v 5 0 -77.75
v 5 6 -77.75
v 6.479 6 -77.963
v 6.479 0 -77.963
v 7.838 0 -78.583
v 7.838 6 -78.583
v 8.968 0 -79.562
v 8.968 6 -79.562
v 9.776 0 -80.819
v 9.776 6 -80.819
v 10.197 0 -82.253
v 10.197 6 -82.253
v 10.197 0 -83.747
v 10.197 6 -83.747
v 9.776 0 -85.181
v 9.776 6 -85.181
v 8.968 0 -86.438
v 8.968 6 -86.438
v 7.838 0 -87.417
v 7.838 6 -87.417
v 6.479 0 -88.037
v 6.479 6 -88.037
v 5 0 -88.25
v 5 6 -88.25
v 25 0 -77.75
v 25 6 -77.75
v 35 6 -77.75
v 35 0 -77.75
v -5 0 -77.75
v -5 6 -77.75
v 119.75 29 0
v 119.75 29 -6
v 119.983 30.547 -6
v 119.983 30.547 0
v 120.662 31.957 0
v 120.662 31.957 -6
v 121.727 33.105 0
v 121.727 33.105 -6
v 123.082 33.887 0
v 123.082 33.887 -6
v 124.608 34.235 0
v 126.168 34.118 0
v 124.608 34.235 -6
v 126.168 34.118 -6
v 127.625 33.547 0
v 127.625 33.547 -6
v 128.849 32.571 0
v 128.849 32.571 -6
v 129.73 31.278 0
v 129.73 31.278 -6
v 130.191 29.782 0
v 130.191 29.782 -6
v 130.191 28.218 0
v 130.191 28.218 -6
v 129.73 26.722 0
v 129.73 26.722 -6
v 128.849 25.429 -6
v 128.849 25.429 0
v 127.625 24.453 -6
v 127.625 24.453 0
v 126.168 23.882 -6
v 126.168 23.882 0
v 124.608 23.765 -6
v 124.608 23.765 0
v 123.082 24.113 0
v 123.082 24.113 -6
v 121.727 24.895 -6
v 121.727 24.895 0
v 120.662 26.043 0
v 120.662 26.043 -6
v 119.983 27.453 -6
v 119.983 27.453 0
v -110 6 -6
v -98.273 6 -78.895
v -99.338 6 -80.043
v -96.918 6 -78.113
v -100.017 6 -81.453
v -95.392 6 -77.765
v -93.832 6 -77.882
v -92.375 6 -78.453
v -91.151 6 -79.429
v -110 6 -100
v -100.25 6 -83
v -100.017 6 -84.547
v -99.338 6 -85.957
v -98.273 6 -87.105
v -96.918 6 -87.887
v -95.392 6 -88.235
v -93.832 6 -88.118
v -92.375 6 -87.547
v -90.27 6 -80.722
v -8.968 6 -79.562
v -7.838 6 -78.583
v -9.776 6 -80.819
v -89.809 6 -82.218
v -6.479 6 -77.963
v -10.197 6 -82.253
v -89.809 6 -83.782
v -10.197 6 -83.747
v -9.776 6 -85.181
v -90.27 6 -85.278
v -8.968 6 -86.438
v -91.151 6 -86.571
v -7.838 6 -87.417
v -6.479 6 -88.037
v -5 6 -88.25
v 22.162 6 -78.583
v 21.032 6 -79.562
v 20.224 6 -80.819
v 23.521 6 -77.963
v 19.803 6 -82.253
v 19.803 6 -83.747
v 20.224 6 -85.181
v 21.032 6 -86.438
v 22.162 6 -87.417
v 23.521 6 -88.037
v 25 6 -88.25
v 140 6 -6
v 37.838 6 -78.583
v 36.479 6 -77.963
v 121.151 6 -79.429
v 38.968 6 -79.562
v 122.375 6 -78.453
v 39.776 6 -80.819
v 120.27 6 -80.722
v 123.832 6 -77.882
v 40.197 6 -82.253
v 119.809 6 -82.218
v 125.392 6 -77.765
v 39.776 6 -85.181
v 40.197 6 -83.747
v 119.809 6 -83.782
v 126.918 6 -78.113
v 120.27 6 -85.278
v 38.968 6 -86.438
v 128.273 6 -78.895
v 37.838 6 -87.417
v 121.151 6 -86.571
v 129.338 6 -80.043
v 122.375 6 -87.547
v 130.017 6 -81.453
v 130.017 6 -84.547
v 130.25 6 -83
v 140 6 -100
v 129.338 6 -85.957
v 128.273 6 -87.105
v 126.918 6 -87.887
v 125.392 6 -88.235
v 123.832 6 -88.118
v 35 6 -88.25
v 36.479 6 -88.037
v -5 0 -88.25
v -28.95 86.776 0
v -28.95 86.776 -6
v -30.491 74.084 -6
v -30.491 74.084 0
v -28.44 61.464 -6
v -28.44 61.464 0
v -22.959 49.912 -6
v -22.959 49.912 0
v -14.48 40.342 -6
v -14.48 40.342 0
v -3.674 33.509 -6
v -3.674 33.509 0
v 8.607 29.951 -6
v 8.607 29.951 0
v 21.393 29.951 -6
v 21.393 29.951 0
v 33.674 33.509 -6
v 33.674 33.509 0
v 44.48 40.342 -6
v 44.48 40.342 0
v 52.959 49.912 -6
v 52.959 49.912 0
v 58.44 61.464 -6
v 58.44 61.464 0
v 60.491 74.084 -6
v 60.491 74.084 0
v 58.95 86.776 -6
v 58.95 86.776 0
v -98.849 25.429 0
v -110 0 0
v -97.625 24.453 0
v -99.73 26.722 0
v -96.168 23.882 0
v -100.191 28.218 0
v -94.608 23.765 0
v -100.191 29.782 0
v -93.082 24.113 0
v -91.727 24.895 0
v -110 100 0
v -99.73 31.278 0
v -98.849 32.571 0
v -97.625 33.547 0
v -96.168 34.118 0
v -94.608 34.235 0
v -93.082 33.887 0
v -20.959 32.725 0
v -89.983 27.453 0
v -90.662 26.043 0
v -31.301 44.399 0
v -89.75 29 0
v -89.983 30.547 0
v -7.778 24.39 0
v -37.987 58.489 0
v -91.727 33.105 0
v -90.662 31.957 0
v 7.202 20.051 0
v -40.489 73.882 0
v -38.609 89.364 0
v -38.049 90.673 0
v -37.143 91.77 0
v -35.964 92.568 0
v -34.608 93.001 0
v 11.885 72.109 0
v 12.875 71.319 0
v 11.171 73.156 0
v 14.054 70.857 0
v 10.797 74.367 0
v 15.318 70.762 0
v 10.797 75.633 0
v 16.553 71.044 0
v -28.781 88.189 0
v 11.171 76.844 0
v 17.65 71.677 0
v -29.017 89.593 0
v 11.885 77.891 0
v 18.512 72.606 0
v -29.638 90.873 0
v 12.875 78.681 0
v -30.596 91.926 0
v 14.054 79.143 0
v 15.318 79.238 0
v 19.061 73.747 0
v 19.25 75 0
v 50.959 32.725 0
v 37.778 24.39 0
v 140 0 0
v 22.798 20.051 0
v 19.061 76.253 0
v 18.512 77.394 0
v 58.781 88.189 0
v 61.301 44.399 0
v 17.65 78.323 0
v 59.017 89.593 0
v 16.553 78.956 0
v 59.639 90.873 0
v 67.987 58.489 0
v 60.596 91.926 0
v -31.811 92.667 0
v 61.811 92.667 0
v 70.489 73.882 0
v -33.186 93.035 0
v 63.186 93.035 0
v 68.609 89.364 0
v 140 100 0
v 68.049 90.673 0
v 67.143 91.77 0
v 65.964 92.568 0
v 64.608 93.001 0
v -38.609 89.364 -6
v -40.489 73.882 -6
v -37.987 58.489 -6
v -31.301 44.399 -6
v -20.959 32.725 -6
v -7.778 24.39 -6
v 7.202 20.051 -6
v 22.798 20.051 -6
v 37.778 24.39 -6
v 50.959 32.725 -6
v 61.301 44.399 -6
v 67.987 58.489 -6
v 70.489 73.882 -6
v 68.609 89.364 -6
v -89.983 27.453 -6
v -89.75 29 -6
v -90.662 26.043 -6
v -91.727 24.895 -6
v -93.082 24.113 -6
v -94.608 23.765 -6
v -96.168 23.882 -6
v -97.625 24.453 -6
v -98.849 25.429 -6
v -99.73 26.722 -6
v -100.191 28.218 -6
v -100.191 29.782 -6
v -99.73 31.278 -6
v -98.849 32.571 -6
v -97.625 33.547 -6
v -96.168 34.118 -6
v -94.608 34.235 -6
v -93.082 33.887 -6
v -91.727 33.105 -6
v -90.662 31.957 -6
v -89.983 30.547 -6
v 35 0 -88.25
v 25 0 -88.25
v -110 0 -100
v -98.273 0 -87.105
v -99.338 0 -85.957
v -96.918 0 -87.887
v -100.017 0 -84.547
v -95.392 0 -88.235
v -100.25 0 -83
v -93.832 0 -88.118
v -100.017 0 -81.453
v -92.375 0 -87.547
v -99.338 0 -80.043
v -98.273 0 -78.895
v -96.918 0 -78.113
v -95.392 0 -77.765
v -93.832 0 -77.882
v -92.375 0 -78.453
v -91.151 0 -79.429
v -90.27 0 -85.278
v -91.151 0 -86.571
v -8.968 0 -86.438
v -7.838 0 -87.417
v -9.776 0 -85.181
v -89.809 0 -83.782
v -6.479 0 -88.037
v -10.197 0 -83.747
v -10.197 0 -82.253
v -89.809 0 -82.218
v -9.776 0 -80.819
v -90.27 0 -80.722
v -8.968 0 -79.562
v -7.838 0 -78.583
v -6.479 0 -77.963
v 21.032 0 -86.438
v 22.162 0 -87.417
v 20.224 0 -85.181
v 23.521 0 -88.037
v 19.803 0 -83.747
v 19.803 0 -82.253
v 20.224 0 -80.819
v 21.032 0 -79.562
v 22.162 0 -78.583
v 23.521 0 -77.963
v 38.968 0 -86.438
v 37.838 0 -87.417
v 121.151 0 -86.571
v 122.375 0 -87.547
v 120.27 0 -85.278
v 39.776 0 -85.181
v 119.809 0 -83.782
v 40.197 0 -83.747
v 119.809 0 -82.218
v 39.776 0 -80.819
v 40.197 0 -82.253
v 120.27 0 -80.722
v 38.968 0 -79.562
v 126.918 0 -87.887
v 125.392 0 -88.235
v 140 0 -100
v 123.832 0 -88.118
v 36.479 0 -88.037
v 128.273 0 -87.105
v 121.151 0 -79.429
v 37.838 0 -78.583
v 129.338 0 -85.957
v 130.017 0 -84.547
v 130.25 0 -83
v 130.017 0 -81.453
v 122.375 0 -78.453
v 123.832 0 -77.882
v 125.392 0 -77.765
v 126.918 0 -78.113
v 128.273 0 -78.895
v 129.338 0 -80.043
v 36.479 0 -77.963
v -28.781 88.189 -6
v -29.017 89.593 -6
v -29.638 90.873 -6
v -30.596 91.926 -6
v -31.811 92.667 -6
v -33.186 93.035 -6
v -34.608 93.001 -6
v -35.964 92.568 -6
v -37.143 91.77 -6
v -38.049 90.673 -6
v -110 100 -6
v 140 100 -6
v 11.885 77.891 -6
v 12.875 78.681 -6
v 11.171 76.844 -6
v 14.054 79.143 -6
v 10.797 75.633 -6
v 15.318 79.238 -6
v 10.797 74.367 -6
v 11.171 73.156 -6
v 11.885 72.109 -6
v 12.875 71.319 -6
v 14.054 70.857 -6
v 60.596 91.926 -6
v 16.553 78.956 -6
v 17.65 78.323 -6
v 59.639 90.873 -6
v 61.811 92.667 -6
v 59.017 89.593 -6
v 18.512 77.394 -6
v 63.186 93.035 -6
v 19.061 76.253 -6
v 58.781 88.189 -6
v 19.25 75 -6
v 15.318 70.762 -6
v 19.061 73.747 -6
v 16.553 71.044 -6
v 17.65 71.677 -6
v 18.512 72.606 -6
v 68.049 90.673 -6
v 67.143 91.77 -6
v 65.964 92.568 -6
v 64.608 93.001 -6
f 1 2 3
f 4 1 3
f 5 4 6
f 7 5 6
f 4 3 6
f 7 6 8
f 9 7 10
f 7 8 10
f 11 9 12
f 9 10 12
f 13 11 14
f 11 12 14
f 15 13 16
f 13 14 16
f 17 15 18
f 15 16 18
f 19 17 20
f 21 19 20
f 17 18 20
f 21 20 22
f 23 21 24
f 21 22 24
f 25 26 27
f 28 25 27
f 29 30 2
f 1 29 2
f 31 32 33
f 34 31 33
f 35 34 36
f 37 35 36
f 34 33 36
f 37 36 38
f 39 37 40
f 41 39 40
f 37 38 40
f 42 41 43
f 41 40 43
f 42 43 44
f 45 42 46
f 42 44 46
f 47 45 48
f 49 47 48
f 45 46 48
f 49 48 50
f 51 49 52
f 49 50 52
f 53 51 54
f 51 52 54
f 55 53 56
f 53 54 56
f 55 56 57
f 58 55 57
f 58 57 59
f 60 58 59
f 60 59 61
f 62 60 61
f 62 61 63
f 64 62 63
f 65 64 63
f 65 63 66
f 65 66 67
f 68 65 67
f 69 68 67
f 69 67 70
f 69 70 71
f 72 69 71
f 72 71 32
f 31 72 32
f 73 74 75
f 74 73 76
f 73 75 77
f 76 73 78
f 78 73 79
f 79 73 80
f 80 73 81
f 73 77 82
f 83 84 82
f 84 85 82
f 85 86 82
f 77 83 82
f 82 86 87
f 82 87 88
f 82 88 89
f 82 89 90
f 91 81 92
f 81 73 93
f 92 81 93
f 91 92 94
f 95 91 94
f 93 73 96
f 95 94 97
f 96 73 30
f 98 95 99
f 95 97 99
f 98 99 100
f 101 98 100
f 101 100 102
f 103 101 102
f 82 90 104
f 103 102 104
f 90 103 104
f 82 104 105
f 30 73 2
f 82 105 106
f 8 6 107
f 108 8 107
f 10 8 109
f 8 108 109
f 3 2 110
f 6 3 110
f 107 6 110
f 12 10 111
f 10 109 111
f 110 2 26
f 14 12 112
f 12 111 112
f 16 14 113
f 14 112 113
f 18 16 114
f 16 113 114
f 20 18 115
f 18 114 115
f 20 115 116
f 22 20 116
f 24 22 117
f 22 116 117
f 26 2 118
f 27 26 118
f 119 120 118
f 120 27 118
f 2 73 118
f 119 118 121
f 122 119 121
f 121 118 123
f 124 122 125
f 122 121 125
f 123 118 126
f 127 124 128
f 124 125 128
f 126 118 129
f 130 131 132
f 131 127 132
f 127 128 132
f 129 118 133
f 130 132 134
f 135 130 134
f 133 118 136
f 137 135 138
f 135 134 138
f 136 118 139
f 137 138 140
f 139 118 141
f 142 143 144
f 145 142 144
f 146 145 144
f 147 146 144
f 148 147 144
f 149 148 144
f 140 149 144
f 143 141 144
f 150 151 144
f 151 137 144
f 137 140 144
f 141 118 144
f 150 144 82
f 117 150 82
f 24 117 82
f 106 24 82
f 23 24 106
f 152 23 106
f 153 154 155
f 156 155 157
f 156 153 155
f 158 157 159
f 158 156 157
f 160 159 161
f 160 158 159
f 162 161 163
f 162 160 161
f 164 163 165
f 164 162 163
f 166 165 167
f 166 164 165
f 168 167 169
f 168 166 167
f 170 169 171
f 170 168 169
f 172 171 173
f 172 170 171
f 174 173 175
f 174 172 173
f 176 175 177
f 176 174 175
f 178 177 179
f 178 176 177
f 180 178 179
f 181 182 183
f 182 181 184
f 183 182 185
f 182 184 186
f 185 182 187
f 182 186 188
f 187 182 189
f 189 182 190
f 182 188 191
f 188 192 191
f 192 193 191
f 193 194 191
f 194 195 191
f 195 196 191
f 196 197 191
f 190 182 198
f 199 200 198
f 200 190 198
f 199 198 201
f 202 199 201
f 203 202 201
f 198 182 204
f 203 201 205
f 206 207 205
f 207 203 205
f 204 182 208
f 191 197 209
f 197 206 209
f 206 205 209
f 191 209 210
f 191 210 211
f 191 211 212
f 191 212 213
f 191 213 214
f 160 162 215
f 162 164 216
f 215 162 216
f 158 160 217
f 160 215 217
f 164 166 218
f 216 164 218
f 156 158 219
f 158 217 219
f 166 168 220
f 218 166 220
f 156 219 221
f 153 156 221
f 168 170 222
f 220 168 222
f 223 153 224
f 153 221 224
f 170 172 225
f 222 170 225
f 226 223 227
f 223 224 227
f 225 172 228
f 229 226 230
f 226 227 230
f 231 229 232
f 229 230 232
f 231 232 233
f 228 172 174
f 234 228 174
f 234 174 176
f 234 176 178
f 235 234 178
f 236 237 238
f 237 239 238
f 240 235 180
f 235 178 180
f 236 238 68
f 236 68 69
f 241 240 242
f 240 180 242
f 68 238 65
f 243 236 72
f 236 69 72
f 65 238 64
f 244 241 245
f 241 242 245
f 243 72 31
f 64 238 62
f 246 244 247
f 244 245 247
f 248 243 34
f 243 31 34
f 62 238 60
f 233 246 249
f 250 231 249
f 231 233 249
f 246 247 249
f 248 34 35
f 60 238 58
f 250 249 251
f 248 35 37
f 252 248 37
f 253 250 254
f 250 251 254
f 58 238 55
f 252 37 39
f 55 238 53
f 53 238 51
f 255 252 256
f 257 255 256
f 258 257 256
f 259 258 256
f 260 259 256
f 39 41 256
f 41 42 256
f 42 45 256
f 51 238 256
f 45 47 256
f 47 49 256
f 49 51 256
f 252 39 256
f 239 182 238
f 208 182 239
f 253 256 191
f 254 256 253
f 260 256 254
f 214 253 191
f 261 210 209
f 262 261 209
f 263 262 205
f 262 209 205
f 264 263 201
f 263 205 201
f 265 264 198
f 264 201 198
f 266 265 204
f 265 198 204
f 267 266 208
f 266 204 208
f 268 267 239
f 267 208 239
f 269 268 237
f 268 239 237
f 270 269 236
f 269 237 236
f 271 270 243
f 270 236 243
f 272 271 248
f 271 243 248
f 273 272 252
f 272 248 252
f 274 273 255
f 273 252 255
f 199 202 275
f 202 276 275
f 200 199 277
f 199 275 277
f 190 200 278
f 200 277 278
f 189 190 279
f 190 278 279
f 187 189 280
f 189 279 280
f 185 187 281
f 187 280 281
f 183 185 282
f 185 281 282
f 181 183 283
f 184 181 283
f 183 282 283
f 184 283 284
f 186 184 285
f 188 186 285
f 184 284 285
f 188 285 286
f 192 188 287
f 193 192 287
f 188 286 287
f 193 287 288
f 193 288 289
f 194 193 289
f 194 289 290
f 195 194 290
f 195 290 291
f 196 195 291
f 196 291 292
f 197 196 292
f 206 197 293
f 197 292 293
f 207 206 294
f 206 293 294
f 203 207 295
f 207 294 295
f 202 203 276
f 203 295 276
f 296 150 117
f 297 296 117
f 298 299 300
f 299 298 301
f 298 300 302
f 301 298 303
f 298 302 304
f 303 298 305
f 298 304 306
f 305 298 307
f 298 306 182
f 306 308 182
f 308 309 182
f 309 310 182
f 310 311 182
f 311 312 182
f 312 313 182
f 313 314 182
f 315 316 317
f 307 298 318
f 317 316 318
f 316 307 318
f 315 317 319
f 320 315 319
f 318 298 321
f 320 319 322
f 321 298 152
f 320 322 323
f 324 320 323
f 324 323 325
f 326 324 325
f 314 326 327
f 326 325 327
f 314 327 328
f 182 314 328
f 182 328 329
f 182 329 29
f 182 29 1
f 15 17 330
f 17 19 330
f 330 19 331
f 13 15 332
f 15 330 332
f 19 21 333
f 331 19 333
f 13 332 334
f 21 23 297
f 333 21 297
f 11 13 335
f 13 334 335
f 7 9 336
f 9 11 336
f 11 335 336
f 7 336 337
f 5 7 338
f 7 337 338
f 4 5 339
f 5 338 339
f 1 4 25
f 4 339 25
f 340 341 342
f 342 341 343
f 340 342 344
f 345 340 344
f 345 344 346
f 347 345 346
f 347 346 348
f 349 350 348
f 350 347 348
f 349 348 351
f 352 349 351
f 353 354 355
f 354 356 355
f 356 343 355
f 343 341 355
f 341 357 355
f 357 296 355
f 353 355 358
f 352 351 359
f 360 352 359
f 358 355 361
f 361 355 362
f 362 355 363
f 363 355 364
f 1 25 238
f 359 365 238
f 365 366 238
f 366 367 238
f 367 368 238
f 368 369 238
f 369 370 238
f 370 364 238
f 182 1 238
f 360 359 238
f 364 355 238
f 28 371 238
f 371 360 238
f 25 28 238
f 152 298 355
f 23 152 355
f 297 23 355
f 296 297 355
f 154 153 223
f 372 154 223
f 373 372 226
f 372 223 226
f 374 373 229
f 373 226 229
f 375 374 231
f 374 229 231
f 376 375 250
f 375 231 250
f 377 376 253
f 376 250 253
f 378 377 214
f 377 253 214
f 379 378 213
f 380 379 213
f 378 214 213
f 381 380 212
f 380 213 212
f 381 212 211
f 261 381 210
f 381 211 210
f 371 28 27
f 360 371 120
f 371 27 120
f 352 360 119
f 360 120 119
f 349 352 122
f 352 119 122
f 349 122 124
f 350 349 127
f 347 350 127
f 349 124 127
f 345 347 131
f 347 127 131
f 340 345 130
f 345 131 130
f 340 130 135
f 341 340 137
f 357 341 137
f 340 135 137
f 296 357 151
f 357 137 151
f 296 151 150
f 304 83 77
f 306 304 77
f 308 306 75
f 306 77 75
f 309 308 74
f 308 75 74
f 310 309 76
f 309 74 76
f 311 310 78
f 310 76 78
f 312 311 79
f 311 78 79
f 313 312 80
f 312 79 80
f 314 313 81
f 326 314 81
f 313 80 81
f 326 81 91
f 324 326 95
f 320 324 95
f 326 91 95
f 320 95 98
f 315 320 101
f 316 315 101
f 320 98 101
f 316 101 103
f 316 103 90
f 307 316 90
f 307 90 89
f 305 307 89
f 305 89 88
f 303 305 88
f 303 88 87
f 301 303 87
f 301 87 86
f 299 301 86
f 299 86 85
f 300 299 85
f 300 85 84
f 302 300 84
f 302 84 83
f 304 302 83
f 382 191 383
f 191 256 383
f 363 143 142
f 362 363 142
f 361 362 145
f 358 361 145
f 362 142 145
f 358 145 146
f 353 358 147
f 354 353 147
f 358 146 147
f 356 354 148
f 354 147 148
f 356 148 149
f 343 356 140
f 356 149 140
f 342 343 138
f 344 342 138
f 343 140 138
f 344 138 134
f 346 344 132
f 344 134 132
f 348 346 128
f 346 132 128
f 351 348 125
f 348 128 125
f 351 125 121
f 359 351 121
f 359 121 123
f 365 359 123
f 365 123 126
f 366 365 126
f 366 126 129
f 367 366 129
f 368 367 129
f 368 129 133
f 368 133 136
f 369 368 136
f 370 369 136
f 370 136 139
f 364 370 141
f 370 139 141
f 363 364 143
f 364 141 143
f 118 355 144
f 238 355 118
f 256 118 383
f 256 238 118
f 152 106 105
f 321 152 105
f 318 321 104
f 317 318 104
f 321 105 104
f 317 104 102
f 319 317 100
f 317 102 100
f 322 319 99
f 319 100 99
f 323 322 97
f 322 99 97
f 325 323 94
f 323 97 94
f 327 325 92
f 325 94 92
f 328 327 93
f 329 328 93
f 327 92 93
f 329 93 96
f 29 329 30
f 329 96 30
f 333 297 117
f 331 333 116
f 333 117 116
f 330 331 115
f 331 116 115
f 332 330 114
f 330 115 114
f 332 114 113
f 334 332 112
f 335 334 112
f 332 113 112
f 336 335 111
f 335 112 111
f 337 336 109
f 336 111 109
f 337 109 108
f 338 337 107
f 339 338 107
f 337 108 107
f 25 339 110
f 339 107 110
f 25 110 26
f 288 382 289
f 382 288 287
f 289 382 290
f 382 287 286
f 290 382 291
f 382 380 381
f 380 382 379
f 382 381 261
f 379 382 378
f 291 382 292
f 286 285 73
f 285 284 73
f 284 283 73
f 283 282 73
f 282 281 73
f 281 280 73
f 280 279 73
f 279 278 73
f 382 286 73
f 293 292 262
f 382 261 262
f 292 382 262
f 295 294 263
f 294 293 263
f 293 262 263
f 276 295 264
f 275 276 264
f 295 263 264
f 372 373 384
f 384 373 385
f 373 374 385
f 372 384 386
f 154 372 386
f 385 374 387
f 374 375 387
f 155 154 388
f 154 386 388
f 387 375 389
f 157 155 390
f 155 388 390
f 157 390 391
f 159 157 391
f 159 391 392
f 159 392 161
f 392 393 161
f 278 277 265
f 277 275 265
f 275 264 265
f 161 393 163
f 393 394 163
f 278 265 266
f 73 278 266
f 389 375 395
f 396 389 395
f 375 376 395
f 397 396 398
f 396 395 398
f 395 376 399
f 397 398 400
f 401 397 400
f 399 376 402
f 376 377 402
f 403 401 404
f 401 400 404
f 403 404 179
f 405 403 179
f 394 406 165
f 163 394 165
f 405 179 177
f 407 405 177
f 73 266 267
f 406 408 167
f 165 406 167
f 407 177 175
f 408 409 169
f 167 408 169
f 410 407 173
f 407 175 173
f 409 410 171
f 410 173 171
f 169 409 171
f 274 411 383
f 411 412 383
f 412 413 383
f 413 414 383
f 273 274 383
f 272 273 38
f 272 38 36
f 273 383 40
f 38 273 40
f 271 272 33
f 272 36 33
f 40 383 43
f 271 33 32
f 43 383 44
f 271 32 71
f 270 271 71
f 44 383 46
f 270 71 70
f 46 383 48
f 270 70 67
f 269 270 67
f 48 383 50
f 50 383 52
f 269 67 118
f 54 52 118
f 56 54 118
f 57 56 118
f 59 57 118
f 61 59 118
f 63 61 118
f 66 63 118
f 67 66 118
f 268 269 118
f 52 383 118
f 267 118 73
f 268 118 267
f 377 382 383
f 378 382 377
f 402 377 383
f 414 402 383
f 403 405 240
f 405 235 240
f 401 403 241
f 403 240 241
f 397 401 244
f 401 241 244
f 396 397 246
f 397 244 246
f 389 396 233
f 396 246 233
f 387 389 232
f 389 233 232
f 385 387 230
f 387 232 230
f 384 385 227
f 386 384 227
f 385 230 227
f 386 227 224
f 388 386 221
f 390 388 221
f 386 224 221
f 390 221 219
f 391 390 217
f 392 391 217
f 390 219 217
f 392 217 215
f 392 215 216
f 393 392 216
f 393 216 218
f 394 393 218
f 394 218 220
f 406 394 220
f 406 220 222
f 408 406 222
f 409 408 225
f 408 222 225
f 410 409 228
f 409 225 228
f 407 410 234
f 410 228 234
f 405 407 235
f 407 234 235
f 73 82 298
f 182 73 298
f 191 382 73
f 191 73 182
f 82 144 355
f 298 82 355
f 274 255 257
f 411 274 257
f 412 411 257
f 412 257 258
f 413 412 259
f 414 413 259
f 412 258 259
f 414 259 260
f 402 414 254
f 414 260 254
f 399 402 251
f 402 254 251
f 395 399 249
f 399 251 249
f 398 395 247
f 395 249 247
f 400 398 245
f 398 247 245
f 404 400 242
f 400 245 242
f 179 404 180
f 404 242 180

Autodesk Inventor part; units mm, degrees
ref_plane "YZ Plane" through (0, 0, 0) normal (1, 0, 0) x (0, 1, 0)
ref_plane "XZ Plane" through (0, 0, 0) normal (0, 1, 0) x (-1, 0, 0)
sketch "Náčrt1" plane through (0, 0, 0) normal (1, 0, 0) x (0, 1, 0)
  line L0 (0, 0) -> (100, 0)
  line L1 (100, 0) -> (100, -6)
  line L2 (100, -6) -> (6, -6)
  line L3 (6, -6) -> (6, -100)
  line L4 (6, -100) -> (0, -100)
  line L5 (0, -100) -> (0, 0)
  point P0 (100, -148)
  point P1 (100, -150)
  dimension "d0" = 100
  dimension "d1" = 6
  dimension "d20" = 100
  dimension "d40" = 6
  dimension "d108" = 94
  dimension "d109" = 94
extrude "Vysunutí1" add sketch "Náčrt1" along normal blind 140
sketch "Náčrt7" plane through (0, 6, -6) normal (0, 0, -1) x (-1, 0, 0)
  circle A0 centre (-125, 23) radius 5.25
  line L0 (0, 0) -> (-140, 0) projected
  line L1 (-140, 0) -> (-140, 94) projected
  line L2 (0, 94) -> (0, 0) projected
  point P0 (0, -6)
  dimension "d43" = 10.5
  dimension "d44" = 23
  dimension "d101" = 15
extrude "Vysunutí6" cut sketch "Náčrt7" against normal through all
sketch "Náčrt11" plane through (0, 0, 0) normal (-1, 0, 0) x (0, 0, 1)
  line L0 (0, 0) -> (0, 100) projected
  line L1 (0, 100) -> (-6, 100) projected
  line L2 (-6, 100) -> (-6, 6) projected
  line L3 (-6, 6) -> (-100, 6) projected
  line L4 (-100, 6) -> (-100, 0) projected
  line L5 (-100, 0) -> (0, 0) projected
extrude "Vysunutí9" add sketch "Náčrt11" along normal blind 110
sketch "Náčrt9" plane through (0, 6, -6) normal (0, 1, 0) x (1, 0, 0)
  line L0 (140, 94) -> (-110, 94) projected
  line L1 (140, -6) -> (140, 94) projected
  line L2 (-110, -6) -> (140, -6) projected
  line L3 (0, -6) -> (140, -6) projected
  arc A0 (5, 71.75) -> (5, 82.25) centre (5, 77) ccw
  arc A1 (-5, 82.25) -> (-5, 71.75) centre (-5, 77) ccw
  line L4 (-5, 71.75) -> (5, 71.75)
  line L5 (5, 82.25) -> (-5, 82.25)
  line L6 (-110, 94) -> (-110, -6) projected
  point P0 (0, -3)
  point P1 (0, 77)
  dimension "d89" = 140
  dimension "d91" = 10.5
  dimension "d92" = 10.5
  dimension "d93" = 10
  dimension "d94" = 5
  dimension "d106" = 17
sketch "Náčrt10" plane through (0, 0, 0) normal (0, 0, 1) x (1, 0, 0)
  line L0 (0, 100) -> (140, 100) projected
  circle A0 centre (125, 29) radius 5.25 projected
  circle A1 centre (15, 75) radius 4.25
  arc A2 (-28.9496, 86.7763) -> (58.9496, 86.7763) centre (15, 75) ccw
  arc A3 (-38.6089, 89.3645) -> (68.6089, 89.3645) centre (15, 75) ccw
  arc A4 (68.6089, 89.3645) -> (58.9496, 86.7763) centre (63.7793, 88.0704) ccw
  line L1 (15, 75) -> (84.9162, 75)
  line L2 (15, 75) -> (59.3726, 86.8896)
  line L3 (15, 75) -> (15, -2.5844)
  line L4 (15, 75) -> (-28.9496, 86.7763)
  arc A5 (-28.9496, 86.7763) -> (-38.6089, 89.3645) centre (-33.7793, 88.0704) ccw
  line L5 (140, 100) -> (140, 0) projected
  line L6 (0, 0) -> (140, 0) projected
  dimension "d66" = 8.5
  dimension "d67" = 91
  dimension "d68" = 111
  dimension "d69" = 10
  dimension "d70" = 10
  dimension "d73" = 15
  dimension "d74" = 105
  dimension "d78" = 10
  dimension "d83" = 125
  dimension "d84" = 75
extrude "Vysunutí13" cut sketch "Náčrt9" against normal through all contours L4 A1 L5 A0
extrude "Vysunutí14" cut sketch "Náčrt10" against normal through all contours L1 L2 A1 | A1 L3 L1 | L2 L4 A1 | A1 L4 L3 | L1 A3 L3 A2 | A2 A4 A3 L1 | L3 A3 A5 A2
ref_plane "Pracovní rovina2" through (15, 0, 0) normal (1, 0, 0) x (0, 0, -1)
mirror "Zrcadlit2" about plane through (15, 0, 0) normal (1, 0, 0) of "Vysunutí13", "Vysunutí6"
sketch "Náčrt12" plane through (140, 6, -6) normal (0, 1, 0) x (1, 0, 0)
  line L0 (-115, 82.25) -> (-105, 82.25) projected
  arc A0 (-105, 71.75) -> (-105, 82.25) centre (-105, 77) ccw projected
  line L1 (-105, 71.75) -> (-115, 71.75) projected
  arc A1 (-115, 82.25) -> (-115, 71.75) centre (-115, 77) ccw projected
  line L2 (-135, 71.75) -> (-145, 71.75) projected
  arc A2 (-145, 82.25) -> (-145, 71.75) centre (-145, 77) ccw projected
  line L3 (-145, 82.25) -> (-135, 82.25) projected
  arc A3 (-135, 71.75) -> (-135, 82.25) centre (-135, 77) ccw projected
  line L4 (0, 0) -> (-250, 0) projected
  line L5 (0, 94) -> (0, 0) projected
  line L6 (0, 94) -> (-250, 94) projected
  line L7 (-250, 0) -> (-250, 94) projected
  circle A4 centre (-15, 77) radius 5.25
  point P0 (-140, -6)
  dimension "d102" = 10.5
  dimension "d103" = 15
  dimension "d107" = 17
extrude "Vysunutí15" cut sketch "Náčrt12" against normal through all contours A4
mirror "Zrcadlit3" about plane through (15, 0, 0) normal (1, 0, 0) of "Vysunutí15"
properties part number "L profil"
